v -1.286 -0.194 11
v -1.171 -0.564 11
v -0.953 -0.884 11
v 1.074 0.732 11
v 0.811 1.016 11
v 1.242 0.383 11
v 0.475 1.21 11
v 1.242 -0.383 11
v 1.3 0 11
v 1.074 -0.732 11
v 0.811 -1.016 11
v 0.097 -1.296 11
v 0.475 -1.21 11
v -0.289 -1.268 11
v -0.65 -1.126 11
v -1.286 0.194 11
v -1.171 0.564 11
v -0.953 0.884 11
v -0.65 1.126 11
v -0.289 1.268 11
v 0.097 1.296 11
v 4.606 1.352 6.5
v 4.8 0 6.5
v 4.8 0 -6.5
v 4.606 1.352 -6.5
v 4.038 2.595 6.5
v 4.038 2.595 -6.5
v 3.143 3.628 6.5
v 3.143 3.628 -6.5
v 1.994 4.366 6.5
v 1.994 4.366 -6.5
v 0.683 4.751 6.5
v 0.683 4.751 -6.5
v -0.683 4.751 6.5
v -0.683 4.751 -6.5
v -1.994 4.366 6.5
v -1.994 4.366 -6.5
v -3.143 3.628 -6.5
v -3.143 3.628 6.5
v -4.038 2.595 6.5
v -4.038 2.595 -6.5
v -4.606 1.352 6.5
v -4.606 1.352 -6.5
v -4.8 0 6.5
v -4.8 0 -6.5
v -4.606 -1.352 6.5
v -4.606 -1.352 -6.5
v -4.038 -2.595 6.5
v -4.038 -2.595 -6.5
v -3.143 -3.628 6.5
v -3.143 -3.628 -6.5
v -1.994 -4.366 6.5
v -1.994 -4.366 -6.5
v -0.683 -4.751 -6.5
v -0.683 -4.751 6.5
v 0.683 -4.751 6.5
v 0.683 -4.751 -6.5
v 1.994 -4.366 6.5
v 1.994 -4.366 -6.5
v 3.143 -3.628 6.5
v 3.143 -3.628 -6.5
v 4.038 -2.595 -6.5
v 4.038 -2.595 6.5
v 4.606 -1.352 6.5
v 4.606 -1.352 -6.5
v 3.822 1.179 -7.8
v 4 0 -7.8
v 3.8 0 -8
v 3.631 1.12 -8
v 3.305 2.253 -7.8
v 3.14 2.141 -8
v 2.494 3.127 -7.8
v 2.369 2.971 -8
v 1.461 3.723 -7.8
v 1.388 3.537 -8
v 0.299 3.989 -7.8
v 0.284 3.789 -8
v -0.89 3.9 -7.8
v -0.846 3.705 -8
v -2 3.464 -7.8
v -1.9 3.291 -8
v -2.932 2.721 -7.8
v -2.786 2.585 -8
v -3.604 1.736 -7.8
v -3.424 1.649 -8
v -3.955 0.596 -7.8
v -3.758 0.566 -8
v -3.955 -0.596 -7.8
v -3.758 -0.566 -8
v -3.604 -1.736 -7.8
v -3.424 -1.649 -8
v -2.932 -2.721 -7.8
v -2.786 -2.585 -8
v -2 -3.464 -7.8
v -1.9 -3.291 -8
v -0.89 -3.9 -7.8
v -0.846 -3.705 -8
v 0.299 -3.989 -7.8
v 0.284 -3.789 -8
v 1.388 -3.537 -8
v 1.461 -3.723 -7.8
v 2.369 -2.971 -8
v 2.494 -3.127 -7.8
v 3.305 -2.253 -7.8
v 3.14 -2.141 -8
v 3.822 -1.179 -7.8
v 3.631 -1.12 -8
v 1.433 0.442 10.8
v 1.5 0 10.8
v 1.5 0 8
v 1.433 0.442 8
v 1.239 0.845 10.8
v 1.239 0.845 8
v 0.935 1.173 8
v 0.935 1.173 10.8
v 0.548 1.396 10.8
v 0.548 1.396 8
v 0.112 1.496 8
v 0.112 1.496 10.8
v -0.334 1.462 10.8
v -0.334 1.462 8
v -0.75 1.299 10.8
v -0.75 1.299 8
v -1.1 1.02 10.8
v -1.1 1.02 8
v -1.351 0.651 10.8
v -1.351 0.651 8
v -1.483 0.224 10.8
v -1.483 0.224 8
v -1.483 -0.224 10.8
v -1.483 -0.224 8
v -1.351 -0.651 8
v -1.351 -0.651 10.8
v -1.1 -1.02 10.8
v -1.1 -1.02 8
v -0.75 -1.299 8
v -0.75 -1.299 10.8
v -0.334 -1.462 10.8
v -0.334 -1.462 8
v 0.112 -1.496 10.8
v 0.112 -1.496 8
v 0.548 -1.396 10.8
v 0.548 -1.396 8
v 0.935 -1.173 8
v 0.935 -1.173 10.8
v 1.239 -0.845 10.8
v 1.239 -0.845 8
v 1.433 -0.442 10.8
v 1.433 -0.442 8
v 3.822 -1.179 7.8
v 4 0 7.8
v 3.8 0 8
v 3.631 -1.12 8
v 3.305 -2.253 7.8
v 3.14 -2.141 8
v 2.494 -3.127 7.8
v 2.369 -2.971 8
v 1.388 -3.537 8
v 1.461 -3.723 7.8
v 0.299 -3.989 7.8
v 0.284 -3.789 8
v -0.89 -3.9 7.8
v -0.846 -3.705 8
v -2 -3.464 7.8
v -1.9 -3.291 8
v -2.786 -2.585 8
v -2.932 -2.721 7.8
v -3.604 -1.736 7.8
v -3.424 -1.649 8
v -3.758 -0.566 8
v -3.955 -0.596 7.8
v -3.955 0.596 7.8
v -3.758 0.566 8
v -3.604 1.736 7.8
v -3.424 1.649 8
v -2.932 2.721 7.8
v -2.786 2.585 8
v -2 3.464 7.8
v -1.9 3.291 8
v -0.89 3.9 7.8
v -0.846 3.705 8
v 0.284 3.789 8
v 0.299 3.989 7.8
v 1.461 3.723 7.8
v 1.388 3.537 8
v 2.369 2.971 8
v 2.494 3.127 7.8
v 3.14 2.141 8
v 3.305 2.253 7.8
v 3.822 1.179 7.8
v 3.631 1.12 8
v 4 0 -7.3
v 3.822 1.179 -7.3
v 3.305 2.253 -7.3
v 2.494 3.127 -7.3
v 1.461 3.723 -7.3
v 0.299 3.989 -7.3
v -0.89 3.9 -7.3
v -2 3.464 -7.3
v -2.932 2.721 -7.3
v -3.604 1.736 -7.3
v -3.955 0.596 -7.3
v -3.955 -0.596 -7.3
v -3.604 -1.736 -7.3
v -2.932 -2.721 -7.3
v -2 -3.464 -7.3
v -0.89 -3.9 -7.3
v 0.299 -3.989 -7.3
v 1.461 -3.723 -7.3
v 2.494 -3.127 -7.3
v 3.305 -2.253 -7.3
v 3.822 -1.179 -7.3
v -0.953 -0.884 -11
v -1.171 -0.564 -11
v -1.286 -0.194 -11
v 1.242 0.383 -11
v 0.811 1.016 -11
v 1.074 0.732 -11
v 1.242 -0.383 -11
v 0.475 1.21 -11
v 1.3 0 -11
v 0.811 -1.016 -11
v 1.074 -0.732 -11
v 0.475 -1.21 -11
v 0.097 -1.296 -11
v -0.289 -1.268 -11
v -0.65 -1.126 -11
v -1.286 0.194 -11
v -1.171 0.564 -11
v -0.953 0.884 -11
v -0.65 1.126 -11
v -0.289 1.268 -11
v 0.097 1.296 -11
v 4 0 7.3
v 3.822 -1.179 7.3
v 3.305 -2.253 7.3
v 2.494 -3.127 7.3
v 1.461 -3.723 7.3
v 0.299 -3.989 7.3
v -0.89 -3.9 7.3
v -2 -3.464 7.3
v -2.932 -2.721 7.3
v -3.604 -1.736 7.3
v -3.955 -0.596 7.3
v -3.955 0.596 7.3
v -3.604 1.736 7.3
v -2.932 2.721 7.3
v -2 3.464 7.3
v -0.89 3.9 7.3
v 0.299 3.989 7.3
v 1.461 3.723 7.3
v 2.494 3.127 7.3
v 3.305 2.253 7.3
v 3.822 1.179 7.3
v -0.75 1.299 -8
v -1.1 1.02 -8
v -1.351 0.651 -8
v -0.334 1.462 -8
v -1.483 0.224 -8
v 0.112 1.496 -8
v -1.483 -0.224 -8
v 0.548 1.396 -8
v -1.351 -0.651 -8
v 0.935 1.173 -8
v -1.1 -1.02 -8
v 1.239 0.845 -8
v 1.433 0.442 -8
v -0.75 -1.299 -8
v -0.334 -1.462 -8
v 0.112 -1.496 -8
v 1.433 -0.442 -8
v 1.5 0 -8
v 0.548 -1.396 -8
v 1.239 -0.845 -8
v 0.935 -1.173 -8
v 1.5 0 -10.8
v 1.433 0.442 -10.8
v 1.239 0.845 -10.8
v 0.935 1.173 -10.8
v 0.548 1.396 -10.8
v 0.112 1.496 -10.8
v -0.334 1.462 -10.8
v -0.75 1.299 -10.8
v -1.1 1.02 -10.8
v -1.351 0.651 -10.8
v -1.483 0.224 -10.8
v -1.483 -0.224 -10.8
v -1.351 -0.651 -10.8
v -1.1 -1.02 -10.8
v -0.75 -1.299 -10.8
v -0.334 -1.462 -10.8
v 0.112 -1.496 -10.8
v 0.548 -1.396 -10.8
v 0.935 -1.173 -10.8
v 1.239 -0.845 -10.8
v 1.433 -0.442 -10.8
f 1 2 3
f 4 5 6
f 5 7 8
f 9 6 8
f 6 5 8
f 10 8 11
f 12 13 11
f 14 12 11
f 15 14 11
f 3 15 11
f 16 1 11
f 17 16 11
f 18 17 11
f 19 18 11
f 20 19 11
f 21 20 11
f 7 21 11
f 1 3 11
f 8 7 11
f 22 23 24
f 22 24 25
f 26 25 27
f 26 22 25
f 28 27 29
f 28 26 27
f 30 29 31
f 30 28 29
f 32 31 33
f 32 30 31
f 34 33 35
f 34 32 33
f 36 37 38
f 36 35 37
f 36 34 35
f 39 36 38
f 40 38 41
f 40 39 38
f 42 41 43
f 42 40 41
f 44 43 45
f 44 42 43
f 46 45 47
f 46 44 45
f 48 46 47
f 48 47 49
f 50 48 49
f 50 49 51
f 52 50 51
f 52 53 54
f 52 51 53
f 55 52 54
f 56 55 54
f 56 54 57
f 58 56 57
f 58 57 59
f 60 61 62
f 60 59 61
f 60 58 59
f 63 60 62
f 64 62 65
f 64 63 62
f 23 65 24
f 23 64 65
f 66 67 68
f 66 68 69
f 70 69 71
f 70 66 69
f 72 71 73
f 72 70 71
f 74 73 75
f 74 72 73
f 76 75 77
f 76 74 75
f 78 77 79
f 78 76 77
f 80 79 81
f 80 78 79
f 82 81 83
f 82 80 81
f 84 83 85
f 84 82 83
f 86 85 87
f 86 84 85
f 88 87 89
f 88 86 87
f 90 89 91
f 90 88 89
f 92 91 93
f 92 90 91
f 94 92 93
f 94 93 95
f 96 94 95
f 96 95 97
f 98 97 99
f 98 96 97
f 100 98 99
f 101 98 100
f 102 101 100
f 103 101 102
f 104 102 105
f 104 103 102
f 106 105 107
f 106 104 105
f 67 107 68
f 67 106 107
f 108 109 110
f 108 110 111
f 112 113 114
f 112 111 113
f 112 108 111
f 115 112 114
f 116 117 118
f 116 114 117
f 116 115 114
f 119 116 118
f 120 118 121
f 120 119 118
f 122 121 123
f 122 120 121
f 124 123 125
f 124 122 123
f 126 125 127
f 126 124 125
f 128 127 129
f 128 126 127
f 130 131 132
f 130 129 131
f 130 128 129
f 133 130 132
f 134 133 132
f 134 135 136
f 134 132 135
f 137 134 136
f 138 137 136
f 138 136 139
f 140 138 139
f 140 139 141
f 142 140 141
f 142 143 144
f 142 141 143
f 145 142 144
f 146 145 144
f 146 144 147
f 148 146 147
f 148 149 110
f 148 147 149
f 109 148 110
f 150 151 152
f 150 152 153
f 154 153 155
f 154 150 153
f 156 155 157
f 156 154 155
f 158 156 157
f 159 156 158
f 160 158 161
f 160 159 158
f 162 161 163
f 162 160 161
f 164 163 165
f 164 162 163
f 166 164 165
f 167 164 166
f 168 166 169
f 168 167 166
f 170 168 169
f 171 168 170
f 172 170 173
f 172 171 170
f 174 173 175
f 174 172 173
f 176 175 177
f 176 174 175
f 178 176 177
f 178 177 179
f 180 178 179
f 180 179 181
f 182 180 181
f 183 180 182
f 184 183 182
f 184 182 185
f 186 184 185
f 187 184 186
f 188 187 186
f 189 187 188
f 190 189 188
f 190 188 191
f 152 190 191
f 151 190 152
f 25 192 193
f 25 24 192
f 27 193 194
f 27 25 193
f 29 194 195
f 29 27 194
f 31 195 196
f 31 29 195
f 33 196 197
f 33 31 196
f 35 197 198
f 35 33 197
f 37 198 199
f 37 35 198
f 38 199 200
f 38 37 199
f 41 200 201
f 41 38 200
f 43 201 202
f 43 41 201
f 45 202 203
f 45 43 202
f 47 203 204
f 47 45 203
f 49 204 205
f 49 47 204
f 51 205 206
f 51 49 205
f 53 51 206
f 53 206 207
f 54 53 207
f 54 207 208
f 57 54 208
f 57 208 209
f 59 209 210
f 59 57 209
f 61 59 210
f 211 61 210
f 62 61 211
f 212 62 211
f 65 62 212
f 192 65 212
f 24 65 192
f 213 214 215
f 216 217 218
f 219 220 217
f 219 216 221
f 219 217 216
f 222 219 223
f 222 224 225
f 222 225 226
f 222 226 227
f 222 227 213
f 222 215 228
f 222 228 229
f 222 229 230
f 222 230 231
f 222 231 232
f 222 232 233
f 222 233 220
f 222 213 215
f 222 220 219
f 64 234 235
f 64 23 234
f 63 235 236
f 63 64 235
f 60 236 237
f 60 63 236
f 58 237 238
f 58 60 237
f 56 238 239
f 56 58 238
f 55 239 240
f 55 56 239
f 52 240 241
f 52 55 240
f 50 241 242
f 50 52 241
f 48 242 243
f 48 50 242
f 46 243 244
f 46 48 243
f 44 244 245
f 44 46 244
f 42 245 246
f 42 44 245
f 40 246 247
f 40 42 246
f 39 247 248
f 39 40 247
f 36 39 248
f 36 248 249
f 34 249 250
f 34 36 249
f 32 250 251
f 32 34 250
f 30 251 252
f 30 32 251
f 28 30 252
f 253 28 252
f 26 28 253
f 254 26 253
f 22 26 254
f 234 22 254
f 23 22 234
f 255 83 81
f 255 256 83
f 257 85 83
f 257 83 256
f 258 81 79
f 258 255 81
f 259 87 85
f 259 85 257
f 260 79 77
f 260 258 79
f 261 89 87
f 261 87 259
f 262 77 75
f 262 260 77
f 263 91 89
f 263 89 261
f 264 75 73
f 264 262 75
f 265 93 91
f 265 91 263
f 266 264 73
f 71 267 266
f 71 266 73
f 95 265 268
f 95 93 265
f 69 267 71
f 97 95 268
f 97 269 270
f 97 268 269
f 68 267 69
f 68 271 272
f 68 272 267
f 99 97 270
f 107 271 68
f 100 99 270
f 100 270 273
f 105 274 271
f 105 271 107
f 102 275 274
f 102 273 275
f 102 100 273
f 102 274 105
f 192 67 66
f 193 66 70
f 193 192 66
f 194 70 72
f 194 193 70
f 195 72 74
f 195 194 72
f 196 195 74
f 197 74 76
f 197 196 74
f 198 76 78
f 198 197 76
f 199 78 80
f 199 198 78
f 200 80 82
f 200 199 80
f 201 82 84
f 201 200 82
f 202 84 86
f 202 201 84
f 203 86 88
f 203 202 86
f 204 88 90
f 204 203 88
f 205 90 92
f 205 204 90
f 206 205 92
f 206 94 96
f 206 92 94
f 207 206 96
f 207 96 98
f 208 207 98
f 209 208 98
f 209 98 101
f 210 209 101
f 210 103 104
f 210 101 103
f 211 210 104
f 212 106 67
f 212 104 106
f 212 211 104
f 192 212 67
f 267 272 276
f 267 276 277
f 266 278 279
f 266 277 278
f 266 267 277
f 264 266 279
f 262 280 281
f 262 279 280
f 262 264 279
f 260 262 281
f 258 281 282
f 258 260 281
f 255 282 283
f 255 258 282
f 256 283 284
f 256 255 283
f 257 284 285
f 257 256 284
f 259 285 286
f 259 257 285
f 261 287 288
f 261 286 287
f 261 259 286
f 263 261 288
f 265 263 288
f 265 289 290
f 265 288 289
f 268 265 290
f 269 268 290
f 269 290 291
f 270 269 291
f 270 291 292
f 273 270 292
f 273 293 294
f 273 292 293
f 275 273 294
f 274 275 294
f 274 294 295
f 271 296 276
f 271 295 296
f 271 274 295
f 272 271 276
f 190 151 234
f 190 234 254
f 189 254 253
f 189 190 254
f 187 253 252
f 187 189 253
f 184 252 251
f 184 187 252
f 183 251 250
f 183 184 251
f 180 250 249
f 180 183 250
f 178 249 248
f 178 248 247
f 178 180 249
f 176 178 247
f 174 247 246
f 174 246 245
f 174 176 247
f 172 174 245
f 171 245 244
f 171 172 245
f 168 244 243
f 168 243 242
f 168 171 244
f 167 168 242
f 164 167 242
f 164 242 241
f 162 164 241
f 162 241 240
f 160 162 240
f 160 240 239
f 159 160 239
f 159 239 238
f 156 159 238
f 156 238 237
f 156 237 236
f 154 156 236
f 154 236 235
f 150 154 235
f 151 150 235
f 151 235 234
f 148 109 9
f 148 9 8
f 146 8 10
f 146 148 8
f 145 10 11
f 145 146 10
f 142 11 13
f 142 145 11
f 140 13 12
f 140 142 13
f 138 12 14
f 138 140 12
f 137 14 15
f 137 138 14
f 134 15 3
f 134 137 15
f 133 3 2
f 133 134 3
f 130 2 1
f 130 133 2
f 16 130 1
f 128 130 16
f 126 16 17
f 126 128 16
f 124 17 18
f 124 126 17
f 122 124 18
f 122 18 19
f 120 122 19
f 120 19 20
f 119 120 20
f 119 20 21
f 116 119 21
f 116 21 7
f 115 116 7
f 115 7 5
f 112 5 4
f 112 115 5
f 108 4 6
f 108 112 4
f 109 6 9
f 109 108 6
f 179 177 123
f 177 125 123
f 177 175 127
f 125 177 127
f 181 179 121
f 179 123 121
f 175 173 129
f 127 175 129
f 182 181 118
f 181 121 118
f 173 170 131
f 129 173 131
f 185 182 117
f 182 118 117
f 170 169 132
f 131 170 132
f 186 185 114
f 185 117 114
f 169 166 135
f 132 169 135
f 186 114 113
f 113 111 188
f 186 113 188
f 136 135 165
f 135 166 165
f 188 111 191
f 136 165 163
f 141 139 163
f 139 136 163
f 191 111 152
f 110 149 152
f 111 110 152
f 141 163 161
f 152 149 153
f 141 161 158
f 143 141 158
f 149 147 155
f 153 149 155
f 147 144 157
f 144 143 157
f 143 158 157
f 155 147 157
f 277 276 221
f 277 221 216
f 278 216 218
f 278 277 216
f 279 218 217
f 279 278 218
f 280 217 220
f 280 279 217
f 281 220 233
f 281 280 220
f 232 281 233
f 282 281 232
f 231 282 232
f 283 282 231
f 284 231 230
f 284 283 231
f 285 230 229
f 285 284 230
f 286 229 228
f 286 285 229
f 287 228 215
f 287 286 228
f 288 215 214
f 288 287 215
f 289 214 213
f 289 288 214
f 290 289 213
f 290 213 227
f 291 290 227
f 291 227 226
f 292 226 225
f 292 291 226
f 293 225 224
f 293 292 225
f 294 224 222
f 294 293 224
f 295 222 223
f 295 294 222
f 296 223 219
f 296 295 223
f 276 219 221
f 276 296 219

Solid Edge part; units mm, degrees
sketch "Sketch1" plane through (0, 0, 0) normal (0, -1, 0) x (1, 0, 0)
  line L0 (4, 8) -> (1.5, 8)
  line L1 (1.5, 8) -> (1.5, 11)
  line L2 (1.5, 11) -> (0, 11)
  line L3 (0, 11) -> (0, -11)
  line L4 (0, -11) -> (1.5, -11)
  line L5 (1.5, -11) -> (1.5, -8)
  line L6 (1.5, -8) -> (4, -8)
  line L7 (4, -8) -> (4, -7.5)
  line L8 (4, -7.5) -> (4.8, -7.5)
  line L9 (4.8, -7.5) -> (4.8, 7.5)
  line L10 (4.8, 7.5) -> (4, 7.5)
  line L11 (4, 7.5) -> (4, 8)
revolve "RevolvedProtrusion1" add sketch "Sketch1" angle 360 about axis through (0, 0, 11) along (0, 0, -1)
chamfer "Chaflán_2" distance 0.2 angle 45 4 edges at (-1.5, 0, -11) (-1.5, 0, 11) (-4, 0, 8) (-4, 0, -8)
chamfer "Chaflán_3" distance 1 angle 45 2 edges at (-4.8, 0, -7.5) (-4.8, 0, 7.5)
chamfer "Chamfer1" [suppressed]
